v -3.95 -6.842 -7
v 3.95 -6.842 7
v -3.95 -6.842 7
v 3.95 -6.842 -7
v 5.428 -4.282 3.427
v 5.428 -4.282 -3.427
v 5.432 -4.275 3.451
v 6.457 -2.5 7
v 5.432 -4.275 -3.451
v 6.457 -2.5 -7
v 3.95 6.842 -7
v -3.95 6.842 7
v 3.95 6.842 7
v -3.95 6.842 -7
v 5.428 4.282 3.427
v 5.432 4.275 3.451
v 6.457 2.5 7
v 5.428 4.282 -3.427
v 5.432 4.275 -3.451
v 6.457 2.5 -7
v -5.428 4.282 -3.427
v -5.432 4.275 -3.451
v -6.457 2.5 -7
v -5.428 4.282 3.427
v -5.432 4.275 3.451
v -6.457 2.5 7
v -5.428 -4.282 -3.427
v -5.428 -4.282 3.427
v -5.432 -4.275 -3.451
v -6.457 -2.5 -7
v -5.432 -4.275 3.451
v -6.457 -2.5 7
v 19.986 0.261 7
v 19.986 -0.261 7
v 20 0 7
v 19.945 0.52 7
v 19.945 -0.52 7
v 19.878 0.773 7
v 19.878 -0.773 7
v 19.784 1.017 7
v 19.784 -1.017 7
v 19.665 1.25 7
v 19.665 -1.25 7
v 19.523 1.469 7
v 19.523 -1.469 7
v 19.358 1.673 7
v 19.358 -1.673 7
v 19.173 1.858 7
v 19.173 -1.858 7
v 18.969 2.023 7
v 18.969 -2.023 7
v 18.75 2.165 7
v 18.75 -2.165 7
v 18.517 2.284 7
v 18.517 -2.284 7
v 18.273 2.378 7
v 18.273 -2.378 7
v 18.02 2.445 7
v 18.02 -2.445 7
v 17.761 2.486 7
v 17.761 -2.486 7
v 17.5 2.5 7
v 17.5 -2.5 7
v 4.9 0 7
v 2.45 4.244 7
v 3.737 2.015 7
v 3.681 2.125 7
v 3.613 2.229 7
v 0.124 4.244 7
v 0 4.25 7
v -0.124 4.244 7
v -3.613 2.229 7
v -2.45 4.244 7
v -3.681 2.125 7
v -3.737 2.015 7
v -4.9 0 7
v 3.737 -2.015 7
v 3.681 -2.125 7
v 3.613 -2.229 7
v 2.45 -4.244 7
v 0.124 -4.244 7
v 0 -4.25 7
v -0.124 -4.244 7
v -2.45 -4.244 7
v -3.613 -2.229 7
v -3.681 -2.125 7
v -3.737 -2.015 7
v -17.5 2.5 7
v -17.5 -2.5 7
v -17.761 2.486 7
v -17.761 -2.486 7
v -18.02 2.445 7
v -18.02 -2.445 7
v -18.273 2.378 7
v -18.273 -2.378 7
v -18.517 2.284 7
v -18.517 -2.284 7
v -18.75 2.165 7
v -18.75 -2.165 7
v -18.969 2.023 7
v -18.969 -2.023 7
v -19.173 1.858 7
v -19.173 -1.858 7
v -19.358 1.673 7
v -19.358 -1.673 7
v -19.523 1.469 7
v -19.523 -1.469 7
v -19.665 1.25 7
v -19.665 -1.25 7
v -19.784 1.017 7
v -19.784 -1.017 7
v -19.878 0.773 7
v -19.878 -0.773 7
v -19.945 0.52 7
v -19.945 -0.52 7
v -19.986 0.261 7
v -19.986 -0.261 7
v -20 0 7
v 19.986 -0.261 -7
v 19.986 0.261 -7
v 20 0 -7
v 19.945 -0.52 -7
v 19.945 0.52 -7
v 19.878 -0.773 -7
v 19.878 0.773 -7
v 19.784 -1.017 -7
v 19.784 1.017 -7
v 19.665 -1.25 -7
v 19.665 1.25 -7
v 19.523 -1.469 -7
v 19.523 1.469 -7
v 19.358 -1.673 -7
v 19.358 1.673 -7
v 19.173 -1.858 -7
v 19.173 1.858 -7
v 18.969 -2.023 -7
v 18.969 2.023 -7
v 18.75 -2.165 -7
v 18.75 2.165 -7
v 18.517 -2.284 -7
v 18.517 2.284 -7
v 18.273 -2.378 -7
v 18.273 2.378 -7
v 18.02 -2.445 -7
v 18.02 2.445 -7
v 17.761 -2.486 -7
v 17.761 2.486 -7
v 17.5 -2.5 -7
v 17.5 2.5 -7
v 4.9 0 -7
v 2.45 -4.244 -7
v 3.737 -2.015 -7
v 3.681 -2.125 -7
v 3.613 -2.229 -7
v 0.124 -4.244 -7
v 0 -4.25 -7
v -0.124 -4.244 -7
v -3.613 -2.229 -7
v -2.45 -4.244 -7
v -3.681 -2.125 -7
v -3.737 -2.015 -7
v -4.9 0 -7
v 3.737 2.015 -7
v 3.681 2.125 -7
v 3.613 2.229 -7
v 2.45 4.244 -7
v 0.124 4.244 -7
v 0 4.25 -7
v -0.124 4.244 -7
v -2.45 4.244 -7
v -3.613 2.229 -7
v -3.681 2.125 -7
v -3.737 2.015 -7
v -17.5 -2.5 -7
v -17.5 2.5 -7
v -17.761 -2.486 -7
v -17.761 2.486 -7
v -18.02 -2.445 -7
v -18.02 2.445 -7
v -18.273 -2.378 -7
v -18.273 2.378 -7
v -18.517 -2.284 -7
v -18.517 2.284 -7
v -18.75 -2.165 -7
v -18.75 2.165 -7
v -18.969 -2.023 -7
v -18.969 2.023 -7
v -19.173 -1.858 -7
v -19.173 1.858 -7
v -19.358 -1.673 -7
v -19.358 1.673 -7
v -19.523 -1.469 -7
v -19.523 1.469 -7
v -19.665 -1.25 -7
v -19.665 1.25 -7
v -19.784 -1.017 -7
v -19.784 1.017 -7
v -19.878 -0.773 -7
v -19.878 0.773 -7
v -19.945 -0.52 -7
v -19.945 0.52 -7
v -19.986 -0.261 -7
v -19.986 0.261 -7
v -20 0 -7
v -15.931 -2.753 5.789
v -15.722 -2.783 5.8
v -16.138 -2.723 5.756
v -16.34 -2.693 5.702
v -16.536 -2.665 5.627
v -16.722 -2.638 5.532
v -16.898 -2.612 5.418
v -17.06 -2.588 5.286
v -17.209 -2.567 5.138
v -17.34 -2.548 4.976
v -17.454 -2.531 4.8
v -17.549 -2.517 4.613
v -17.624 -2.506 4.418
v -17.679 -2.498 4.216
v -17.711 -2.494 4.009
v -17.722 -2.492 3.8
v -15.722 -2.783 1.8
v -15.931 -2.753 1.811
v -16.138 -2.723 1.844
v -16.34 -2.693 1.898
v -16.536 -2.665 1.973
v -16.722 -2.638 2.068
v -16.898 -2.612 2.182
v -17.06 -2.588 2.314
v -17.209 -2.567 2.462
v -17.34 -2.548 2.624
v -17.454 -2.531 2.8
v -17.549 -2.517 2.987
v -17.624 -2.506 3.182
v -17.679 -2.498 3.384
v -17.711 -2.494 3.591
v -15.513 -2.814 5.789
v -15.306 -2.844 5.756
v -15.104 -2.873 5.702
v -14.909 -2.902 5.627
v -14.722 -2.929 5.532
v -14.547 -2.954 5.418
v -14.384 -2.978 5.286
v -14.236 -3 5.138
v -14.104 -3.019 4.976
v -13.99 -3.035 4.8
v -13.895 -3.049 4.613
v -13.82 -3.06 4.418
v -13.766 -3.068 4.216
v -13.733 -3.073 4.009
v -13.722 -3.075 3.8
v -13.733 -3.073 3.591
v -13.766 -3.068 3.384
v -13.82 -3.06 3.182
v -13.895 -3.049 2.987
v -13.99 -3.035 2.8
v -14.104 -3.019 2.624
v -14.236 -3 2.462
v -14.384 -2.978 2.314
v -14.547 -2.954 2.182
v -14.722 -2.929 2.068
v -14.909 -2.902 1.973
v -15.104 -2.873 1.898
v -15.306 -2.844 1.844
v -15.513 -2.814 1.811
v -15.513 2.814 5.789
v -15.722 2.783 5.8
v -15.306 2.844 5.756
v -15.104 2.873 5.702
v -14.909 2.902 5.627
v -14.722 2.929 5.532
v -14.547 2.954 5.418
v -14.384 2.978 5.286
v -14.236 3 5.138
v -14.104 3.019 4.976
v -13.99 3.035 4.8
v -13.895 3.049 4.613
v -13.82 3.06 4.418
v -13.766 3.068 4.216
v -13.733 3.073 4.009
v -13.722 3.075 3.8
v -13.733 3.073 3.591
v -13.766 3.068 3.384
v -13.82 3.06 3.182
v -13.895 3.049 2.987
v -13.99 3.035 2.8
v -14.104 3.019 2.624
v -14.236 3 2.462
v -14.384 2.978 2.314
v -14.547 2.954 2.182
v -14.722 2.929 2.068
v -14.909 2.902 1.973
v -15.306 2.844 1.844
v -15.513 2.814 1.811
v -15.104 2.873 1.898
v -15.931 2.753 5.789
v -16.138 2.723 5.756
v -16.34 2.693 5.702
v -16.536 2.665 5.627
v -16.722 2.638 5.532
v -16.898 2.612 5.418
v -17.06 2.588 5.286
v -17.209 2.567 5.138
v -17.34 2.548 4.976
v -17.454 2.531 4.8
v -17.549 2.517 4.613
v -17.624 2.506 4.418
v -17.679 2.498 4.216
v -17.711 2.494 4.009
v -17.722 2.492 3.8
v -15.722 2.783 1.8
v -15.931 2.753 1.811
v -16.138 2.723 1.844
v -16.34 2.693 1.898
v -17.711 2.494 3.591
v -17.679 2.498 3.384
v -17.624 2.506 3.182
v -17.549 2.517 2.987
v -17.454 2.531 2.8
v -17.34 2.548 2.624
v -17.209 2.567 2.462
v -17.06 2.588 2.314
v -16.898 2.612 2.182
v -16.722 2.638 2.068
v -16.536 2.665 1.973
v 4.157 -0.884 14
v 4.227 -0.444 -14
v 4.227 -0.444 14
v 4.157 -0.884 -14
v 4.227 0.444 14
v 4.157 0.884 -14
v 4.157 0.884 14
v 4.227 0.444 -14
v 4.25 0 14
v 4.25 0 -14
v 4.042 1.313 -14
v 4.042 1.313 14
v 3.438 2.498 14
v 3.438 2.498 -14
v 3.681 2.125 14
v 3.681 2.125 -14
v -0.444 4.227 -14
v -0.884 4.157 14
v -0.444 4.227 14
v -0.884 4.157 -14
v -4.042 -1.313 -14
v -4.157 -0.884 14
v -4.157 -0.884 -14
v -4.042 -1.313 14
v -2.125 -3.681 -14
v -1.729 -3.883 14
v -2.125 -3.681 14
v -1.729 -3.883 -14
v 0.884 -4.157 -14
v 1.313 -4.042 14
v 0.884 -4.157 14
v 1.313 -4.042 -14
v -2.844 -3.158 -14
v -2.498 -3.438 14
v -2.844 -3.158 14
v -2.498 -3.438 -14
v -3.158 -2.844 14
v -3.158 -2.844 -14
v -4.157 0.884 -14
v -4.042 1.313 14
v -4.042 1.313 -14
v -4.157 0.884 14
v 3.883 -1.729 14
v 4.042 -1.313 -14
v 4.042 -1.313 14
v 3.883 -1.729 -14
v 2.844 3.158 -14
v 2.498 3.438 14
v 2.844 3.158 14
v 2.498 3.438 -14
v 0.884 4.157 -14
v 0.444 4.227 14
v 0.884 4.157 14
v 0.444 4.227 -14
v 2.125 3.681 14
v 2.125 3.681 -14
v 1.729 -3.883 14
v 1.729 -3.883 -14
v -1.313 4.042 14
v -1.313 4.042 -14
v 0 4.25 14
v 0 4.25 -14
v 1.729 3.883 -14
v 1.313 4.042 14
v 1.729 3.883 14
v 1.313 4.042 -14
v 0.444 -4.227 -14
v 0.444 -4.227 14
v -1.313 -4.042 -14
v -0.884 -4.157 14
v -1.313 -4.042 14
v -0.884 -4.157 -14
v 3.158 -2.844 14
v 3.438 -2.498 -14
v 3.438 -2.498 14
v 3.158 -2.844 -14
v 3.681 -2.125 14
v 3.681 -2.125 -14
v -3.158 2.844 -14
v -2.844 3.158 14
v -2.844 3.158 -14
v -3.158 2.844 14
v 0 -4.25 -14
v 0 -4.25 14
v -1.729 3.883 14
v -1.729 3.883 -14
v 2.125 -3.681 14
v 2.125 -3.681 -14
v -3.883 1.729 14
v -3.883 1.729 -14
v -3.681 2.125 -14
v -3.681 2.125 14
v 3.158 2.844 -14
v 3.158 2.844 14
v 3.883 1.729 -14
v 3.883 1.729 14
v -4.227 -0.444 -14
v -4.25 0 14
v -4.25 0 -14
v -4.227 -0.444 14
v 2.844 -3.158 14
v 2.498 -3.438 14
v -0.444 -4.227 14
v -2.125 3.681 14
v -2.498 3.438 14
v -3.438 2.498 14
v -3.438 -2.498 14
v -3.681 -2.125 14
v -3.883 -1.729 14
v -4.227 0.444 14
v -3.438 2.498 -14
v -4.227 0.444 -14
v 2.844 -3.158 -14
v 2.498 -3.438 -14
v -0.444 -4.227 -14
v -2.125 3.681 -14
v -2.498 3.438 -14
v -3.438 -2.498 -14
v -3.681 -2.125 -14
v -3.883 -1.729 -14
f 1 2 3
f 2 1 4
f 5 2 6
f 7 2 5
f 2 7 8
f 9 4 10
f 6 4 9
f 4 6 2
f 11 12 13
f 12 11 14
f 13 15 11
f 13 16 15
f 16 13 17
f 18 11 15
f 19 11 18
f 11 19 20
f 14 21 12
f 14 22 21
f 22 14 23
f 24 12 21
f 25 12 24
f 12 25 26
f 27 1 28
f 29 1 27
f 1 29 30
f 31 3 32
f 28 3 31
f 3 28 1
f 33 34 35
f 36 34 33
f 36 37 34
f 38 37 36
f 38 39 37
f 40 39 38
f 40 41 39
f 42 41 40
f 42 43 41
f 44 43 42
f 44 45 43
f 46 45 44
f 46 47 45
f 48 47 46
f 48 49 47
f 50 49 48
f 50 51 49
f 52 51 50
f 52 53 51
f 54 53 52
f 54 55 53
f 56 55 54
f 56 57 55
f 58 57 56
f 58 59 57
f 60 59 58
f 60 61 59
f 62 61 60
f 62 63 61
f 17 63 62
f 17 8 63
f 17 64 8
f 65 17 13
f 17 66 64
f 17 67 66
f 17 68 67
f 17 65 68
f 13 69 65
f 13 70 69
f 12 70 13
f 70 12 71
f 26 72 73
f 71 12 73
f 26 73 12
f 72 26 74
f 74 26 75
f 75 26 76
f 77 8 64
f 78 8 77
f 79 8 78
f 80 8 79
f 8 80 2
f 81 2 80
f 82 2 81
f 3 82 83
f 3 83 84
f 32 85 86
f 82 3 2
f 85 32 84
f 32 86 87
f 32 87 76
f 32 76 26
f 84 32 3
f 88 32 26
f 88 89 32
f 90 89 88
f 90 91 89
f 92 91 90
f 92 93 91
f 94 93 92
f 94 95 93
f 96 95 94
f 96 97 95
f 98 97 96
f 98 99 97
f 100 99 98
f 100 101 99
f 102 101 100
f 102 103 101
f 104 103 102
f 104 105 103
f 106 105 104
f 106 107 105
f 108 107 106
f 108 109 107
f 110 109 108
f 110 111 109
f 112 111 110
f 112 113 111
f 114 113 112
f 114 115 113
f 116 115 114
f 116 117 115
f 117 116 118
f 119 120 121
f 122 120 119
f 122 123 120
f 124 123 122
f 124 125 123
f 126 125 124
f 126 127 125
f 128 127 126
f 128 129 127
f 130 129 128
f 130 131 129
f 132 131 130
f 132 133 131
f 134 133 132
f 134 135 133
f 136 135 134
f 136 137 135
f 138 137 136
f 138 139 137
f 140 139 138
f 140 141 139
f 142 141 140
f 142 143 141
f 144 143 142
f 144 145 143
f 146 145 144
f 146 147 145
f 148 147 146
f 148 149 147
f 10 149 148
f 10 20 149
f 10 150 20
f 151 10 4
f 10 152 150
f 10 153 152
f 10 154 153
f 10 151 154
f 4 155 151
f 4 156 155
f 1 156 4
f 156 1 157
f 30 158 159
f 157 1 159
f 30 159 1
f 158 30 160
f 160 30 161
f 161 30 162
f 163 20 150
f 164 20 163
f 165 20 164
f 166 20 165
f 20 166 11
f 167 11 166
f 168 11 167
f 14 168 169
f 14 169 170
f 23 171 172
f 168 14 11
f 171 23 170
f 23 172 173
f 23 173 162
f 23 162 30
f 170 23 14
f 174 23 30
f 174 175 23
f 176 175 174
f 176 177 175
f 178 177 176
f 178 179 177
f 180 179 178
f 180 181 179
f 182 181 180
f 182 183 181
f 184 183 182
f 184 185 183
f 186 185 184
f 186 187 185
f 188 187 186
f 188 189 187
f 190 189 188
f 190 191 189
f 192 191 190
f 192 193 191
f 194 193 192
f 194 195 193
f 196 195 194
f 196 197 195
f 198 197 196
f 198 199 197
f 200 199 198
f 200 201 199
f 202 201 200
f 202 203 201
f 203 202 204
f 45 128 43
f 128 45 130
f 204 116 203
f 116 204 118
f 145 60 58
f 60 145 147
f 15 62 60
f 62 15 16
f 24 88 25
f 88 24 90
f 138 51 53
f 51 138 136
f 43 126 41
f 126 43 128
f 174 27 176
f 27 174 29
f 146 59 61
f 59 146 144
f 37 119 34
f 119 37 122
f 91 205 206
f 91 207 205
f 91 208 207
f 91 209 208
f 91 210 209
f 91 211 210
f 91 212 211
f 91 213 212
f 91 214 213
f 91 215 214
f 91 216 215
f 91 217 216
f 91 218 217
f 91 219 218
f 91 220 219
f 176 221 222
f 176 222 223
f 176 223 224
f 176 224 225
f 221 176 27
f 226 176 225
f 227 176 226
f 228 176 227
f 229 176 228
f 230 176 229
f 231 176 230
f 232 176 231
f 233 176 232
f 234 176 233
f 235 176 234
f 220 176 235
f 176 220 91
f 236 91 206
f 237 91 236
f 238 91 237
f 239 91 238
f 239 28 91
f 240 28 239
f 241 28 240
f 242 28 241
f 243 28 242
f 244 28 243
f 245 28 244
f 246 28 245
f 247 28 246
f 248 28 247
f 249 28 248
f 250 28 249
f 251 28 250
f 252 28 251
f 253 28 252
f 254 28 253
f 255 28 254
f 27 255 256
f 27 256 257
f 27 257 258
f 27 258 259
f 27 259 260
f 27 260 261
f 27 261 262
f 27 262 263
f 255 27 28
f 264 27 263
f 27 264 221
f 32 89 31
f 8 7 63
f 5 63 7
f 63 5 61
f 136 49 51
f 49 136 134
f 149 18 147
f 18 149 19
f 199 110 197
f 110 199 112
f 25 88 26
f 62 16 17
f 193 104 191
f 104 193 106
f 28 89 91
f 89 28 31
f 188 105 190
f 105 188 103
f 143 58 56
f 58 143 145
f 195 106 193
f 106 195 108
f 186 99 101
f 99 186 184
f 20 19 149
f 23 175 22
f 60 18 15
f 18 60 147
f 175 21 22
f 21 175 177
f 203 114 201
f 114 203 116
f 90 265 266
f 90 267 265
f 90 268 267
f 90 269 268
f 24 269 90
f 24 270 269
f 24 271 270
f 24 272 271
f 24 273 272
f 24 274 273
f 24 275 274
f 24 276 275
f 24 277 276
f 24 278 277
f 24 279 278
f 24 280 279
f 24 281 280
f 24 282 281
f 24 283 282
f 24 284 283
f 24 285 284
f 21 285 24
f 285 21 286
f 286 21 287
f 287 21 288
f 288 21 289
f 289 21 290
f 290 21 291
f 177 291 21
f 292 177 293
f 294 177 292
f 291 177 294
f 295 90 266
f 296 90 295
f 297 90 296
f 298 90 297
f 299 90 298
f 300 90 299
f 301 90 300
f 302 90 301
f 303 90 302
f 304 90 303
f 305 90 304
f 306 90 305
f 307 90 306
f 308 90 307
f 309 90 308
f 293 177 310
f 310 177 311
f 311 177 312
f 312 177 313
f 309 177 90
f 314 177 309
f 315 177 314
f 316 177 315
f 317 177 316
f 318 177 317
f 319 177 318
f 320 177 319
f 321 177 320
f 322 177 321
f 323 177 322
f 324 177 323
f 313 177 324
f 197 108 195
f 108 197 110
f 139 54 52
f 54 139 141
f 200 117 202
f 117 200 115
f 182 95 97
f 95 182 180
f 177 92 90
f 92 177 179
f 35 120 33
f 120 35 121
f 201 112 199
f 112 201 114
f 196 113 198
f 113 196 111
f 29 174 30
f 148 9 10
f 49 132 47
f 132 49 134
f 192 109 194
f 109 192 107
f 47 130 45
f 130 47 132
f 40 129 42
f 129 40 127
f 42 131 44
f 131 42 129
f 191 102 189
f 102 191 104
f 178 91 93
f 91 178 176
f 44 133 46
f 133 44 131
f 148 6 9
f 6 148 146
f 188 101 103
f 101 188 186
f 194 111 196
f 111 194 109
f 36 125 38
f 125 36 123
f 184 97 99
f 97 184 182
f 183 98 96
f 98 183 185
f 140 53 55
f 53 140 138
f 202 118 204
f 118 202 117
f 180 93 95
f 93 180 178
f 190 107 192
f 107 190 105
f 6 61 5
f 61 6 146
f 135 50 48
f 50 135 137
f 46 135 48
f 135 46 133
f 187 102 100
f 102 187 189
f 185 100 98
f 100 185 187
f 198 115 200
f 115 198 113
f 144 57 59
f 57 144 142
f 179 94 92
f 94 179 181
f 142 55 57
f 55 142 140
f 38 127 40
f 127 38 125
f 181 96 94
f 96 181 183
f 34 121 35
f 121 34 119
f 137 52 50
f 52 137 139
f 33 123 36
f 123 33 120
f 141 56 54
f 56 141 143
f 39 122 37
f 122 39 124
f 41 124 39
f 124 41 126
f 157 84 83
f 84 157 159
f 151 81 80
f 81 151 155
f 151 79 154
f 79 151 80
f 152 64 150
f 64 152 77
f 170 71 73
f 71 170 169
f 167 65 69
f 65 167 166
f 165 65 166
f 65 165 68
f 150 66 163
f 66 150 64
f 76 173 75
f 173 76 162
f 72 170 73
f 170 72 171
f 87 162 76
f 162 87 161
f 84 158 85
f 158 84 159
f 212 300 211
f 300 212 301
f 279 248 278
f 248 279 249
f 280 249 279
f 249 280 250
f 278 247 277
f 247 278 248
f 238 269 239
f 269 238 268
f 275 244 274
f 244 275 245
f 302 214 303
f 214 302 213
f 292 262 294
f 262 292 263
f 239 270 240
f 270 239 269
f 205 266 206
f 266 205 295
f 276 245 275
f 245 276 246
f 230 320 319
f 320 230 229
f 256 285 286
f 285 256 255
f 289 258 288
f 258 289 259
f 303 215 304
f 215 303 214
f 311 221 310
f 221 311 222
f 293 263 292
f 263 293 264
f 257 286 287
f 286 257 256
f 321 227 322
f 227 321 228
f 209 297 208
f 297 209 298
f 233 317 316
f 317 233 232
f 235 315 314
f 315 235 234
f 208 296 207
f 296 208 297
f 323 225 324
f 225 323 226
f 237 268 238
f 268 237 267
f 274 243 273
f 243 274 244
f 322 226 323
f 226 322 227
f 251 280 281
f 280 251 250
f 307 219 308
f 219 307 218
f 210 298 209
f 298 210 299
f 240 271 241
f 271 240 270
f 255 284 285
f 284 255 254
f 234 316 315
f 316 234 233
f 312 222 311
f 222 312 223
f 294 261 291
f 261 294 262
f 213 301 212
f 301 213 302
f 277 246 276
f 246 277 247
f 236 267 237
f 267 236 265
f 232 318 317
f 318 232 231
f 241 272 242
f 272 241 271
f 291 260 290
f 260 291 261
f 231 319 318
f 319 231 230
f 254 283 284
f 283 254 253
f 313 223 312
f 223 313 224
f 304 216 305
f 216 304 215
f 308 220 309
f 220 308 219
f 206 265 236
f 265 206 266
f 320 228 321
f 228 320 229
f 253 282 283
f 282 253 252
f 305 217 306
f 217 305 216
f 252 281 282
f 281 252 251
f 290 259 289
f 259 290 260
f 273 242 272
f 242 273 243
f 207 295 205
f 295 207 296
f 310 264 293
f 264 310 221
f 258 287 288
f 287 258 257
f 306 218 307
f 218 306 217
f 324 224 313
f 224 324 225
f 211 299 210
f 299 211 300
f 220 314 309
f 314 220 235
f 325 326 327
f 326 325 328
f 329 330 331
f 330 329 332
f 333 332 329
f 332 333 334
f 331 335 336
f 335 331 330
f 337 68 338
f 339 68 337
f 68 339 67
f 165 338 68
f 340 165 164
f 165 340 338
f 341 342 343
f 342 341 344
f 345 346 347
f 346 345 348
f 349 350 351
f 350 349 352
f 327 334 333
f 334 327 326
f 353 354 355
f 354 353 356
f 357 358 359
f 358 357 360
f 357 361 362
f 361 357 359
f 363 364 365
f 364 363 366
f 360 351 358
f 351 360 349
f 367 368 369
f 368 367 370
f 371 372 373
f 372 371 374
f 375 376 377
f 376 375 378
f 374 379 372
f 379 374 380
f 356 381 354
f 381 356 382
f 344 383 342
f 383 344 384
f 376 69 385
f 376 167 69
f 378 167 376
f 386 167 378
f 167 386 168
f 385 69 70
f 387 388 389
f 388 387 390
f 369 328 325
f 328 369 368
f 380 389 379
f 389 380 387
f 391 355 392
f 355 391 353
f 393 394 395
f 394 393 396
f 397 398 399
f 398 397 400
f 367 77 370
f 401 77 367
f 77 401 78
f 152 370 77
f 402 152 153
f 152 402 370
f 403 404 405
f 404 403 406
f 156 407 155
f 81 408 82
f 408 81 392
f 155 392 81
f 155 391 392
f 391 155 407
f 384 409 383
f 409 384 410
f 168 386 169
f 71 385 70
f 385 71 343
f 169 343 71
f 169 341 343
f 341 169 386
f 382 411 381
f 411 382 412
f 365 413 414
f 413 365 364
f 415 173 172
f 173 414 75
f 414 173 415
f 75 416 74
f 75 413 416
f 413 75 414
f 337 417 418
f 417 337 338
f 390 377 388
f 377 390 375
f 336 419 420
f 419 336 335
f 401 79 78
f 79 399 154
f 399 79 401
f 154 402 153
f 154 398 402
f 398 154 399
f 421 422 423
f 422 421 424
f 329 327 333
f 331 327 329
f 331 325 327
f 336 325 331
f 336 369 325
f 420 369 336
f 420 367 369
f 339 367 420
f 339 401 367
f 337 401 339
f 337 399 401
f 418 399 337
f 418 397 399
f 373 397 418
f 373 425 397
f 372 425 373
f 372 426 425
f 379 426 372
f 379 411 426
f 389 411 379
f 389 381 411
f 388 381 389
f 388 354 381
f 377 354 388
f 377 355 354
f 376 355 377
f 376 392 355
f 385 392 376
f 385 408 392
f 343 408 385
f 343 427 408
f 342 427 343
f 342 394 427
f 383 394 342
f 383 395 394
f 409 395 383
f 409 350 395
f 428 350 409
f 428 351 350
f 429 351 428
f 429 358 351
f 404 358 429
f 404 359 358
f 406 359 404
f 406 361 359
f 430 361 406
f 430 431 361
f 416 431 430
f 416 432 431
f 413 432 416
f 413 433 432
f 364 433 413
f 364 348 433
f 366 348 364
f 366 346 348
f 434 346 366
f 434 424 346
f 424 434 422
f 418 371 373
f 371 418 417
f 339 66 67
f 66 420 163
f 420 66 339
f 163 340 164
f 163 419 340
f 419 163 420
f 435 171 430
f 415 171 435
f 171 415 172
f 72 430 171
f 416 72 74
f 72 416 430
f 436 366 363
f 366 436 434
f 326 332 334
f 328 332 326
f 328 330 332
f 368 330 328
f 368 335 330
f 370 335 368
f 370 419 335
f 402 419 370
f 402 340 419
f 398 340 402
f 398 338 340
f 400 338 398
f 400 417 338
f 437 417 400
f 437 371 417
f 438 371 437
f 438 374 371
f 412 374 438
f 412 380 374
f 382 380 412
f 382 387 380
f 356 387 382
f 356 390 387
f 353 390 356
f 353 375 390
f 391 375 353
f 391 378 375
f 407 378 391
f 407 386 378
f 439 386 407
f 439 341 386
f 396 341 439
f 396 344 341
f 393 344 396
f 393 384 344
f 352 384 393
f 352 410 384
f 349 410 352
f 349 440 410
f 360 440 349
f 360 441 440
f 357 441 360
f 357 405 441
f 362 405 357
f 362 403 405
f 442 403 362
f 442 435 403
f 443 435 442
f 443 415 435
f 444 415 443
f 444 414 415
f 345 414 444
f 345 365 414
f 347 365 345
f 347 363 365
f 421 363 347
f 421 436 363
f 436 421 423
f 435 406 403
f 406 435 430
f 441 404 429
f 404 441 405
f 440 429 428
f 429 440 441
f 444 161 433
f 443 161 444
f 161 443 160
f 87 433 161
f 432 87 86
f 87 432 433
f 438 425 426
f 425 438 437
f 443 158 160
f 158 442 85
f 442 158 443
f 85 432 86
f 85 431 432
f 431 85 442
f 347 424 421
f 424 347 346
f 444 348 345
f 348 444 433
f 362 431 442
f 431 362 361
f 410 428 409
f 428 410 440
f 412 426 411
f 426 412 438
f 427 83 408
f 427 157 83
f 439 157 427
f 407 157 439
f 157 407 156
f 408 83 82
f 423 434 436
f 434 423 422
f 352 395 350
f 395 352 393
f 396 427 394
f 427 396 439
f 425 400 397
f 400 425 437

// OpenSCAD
/*
    Customizable Two-Sided Keyring Thumb Spanner
    
    Set the 'testing' variable to 1 and then use the test_diameter variable to help you size the edge to edge diameter (upper_dia/lower_dia) to get the correct size for your spanner. Add in some tolerance for material shrinkage.
    
    Try to keep the lower_dia variable as your smaller spanner to avoid needing support. Remember to add tolerance for any shrinking you get, it can be worse closer to the heated bed.
    
    - by Harlo
    - 22/05/2016.
    
        ADDING TEXT:
    
        *   Don't forget to add in a reference to your desired font. Use variable 'font_var' to load your desired font into all the text modules automatically.
        **  Uncomment the text modules and the cutting references if you plan on adding them in.
        *** There are two text versions/options in the wrench_outer() module. Either use both the text_8mm (lower) & text_10mm (upper) modules together OR the text_any_mm(). Avoid using both.
*/

//Set to '0' for your final render
testing = 1; //[0,1]
//Edge to Edge Length
test_diameter = 8.5; //[0.1:0.1:20]
//Main Diameter Upper - set to accomodate the tube
upper_dia = 9.8; // [0.5:0.1:30]
//Main Diameter Lower - set to accomodate the tube
lower_dia = 9.8; //[0.5:0.1:30]
//Main Handle Thickness
handle_thickness = 5; //[5:0.1:20]
//Secondary Handle Thickness
handle_thickness_2 = 10; //[0:0.1:40]
//Wall thickness (around the nut)
additional_thickness = 3; //[2:0.1:15]
//Z Height
height = 14; //[3:0.1:60]
//Length of the handle
length = 35; //[25:0.1:100]




//Internal

key_ring_dia = 4*1;
key_ring_z_scale = 1*1;
key_ring_res = 60*1;



wrench_outer();

if (testing == 1){
    test_cut_cylinder();
}

/*
module text_10mm(){
    translate([0,-(upper_dia+additional_thickness)/2,height/4]){
        rotate([270,0,180]){
            text_module("8", 4.5);
        }
    }
}

module text_8mm(){
    translate([0,-(upper_dia+additional_thickness)/2,-height/4]){
        rotate([270,0,180]){
            text_module("8", 4.5);
        }
    }
}

module text_any_mm(){
    translate([0,-(upper_dia+additional_thickness)/2,0]){
        rotate([270,0,180]){
            text_module(label, label_size);
        }
    }
}

module text_module(text_in, text_size){
    scale([1,1,0.01])
    {
        linear_extrude(h = 1, center = true, convexity = 4) {
            text (text_in, size = text_size,font = font_var, halign = "center", valign = "center", $fn = 32 );
        }
    }
}

*/
          

module wrench_outer(){
    difference(){
        union(){
            cylinder(h = height ,d = upper_dia + additional_thickness*2, center = true, $fn = 6);
            handles();
            
        }
        inner_cuts();
        key_ring_cut();        
        //text_10mm(); //TOP
        //text_8mm(); //BOTTOM
        //text_any_mm(); //CENTER
    }
}



module test_cut_cylinder(){
      cylinder(h = height*2 ,d = test_diameter, center = true, $fn = 60);
}


module key_ring_cut(){
    translate([-length/2 + key_ring_dia/2.25,0,height/2 - (key_ring_dia * key_ring_z_scale)/1.25]){
        rotate([90,0,0]){
            scale([1,key_ring_z_scale,1]){
                cylinder(h = handle_thickness*2, d = key_ring_dia, center = true, $fn = key_ring_res);
            }
        }
    }
    
}


module handles(){
    hull(){
        translate([-length/2,0,0]){
            cylinder(h = height, d = handle_thickness, center = true, $fn = 60);
        }
        translate([length/2,0,0]){
            cylinder(h = height, d = handle_thickness, center = true, $fn = 60);
        }
        
        translate([0,0,2]){
            rotate([0,90,0]){    
                cylinder(h = 1, d = handle_thickness_2, center = true, $fn = 4);
            }
        }
        translate([0,0,-2]){
            rotate([0,90,0]){    
                cylinder(h = 1, d = handle_thickness_2, center = true, $fn = 4);
            }
        }
        
    }
}

module inner_cuts(){
    translate([0,0,height/2]){
        cylinder (h = height, d = upper_dia, center = true, $fn = 6);
    }
    
    translate([0,0,-height/2]){
        cylinder (h = height, d = lower_dia, center = true, $fn = 6);
    }
}
